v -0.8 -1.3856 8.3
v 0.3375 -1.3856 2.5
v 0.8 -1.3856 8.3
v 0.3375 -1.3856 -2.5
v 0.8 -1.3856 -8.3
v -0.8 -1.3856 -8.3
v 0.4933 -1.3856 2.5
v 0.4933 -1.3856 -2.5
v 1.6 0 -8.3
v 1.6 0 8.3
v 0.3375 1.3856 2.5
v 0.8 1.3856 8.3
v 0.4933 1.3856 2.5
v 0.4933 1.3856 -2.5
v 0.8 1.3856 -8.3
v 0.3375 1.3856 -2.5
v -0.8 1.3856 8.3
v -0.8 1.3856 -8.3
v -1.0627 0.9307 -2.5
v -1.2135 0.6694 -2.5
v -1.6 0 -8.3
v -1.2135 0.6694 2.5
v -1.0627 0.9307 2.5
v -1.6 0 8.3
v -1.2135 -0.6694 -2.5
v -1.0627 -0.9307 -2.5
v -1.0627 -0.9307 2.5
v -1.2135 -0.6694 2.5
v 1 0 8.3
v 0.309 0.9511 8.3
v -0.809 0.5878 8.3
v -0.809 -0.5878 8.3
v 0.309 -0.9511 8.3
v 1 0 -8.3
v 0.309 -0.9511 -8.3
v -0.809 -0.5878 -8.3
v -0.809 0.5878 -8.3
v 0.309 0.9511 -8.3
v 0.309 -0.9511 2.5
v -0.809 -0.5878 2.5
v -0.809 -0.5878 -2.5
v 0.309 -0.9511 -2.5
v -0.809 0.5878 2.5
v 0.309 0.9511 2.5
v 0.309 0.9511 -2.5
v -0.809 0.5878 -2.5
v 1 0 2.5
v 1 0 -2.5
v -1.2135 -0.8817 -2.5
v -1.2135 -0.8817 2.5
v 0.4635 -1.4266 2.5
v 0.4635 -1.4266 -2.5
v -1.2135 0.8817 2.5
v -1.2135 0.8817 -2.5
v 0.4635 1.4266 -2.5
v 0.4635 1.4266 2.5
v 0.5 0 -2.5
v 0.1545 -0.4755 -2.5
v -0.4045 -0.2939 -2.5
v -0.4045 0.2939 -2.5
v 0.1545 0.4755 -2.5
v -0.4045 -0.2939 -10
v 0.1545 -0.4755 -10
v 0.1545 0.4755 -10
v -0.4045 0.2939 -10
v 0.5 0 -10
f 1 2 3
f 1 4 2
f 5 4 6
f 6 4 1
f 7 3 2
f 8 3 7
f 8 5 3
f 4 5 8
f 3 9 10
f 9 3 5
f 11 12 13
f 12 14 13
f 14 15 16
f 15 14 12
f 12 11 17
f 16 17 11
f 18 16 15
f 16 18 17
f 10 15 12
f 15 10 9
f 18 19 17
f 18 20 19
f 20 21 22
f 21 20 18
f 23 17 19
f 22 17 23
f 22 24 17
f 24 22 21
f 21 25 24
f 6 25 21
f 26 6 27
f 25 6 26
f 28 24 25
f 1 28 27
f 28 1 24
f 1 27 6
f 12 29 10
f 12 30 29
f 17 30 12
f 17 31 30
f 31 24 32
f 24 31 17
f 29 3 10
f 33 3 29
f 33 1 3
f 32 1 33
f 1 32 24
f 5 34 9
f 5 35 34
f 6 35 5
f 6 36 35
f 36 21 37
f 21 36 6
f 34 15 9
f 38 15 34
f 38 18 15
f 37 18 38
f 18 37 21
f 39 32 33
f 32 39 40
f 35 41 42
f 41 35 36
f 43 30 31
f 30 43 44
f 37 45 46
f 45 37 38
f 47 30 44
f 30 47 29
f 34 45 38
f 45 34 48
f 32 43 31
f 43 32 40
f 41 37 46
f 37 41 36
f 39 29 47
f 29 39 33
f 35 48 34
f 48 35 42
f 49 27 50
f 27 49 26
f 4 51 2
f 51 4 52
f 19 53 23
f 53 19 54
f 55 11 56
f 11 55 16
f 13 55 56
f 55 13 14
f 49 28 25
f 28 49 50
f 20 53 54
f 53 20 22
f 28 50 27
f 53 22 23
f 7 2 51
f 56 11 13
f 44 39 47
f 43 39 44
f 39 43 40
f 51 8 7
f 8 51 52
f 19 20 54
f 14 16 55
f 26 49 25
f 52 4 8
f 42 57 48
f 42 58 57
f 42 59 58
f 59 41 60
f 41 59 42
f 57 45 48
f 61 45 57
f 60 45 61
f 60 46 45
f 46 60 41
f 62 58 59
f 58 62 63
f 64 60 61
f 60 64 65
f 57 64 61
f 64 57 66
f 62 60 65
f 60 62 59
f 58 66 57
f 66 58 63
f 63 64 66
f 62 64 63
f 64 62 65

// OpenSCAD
// Parameters
length = 15; //[8:30:1]
forced_id = 0; //[0:10:1]
center = 1; //[0:1:1]
original_id = 2.0; //[1.0:6.0:0.5]
original_od = 3.2; //[1.6:12.0:0.5]
eps = 0.8; //[0.5:2.0:0.1]

// Derived parameters
id = (forced_id > 0) ? forced_id : original_id;
od = original_od + id - original_id;

// Tubing - complete geometry
module tubing() {
  color([0.85, 0.85, 0.8]) {
    difference() {
      // Outer diameter profile
      cylinder(r=od/2, h=length + 2*eps, center=true);
      // Inner bore
      cylinder(r=id/2, h=length + 4*eps, center=true);
    }
  }
}

// Sleeved Resistor - complete geometry
module sleeved_resistor() {
  color([0.2, 0.2, 0.2]) {
    // Resistor body
    cylinder(r=1.5, h=5, center=true);
    // Leads
    translate([0, 0, -5]) cylinder(r=0.5, h=10, center=true);
  }
}

// Assembly
module assembly() {
  translate([0, 0, center ? 0 : length/2]) tubing();
  translate([0, 0, center ? 0 : length/2]) sleeved_resistor();
}

assembly();
